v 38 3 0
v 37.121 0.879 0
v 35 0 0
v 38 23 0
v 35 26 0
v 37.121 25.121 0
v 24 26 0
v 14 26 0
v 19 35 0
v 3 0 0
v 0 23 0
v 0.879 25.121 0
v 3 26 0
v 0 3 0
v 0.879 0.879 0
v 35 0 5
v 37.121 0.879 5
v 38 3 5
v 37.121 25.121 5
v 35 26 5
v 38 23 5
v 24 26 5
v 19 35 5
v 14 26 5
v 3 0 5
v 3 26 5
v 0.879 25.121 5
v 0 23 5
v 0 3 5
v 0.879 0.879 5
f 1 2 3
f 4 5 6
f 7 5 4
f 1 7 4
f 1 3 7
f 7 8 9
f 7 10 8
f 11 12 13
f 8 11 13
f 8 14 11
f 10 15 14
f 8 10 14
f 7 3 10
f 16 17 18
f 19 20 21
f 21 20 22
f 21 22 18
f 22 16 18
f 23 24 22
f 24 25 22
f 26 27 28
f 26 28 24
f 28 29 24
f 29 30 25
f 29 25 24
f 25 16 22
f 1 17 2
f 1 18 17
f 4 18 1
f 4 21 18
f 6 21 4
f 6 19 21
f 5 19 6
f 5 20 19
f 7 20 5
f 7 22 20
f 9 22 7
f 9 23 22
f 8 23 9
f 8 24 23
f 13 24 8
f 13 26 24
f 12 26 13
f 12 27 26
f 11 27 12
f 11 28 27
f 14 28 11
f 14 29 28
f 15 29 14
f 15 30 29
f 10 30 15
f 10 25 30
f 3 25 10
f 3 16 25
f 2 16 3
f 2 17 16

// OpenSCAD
$fn = 32;

// ----------------------------------------------------------------------
// Ratchet pawl: 38 x 26 mm body, beak 9 mm сверху
// ----------------------------------------------------------------------

// --- parameters (mm) ---
profile_height = 5;       // extrusion height
profile_points = 15;      // points of the closed outline

profile = [[0, 3], [0.879, 0.879], [3, 0], [35, 0], [37.121, 0.879], [38, 3], [38, 23], [37.121, 25.121], [35, 26], [24, 26], [19, 35], [14, 26], [3, 26], [0.879, 25.121], [0, 23]];  // single closed polygon, 15 points, counter clockwise

// --- the one profile operation ---
linear_extrude(height = profile_height) polygon(points = profile);
